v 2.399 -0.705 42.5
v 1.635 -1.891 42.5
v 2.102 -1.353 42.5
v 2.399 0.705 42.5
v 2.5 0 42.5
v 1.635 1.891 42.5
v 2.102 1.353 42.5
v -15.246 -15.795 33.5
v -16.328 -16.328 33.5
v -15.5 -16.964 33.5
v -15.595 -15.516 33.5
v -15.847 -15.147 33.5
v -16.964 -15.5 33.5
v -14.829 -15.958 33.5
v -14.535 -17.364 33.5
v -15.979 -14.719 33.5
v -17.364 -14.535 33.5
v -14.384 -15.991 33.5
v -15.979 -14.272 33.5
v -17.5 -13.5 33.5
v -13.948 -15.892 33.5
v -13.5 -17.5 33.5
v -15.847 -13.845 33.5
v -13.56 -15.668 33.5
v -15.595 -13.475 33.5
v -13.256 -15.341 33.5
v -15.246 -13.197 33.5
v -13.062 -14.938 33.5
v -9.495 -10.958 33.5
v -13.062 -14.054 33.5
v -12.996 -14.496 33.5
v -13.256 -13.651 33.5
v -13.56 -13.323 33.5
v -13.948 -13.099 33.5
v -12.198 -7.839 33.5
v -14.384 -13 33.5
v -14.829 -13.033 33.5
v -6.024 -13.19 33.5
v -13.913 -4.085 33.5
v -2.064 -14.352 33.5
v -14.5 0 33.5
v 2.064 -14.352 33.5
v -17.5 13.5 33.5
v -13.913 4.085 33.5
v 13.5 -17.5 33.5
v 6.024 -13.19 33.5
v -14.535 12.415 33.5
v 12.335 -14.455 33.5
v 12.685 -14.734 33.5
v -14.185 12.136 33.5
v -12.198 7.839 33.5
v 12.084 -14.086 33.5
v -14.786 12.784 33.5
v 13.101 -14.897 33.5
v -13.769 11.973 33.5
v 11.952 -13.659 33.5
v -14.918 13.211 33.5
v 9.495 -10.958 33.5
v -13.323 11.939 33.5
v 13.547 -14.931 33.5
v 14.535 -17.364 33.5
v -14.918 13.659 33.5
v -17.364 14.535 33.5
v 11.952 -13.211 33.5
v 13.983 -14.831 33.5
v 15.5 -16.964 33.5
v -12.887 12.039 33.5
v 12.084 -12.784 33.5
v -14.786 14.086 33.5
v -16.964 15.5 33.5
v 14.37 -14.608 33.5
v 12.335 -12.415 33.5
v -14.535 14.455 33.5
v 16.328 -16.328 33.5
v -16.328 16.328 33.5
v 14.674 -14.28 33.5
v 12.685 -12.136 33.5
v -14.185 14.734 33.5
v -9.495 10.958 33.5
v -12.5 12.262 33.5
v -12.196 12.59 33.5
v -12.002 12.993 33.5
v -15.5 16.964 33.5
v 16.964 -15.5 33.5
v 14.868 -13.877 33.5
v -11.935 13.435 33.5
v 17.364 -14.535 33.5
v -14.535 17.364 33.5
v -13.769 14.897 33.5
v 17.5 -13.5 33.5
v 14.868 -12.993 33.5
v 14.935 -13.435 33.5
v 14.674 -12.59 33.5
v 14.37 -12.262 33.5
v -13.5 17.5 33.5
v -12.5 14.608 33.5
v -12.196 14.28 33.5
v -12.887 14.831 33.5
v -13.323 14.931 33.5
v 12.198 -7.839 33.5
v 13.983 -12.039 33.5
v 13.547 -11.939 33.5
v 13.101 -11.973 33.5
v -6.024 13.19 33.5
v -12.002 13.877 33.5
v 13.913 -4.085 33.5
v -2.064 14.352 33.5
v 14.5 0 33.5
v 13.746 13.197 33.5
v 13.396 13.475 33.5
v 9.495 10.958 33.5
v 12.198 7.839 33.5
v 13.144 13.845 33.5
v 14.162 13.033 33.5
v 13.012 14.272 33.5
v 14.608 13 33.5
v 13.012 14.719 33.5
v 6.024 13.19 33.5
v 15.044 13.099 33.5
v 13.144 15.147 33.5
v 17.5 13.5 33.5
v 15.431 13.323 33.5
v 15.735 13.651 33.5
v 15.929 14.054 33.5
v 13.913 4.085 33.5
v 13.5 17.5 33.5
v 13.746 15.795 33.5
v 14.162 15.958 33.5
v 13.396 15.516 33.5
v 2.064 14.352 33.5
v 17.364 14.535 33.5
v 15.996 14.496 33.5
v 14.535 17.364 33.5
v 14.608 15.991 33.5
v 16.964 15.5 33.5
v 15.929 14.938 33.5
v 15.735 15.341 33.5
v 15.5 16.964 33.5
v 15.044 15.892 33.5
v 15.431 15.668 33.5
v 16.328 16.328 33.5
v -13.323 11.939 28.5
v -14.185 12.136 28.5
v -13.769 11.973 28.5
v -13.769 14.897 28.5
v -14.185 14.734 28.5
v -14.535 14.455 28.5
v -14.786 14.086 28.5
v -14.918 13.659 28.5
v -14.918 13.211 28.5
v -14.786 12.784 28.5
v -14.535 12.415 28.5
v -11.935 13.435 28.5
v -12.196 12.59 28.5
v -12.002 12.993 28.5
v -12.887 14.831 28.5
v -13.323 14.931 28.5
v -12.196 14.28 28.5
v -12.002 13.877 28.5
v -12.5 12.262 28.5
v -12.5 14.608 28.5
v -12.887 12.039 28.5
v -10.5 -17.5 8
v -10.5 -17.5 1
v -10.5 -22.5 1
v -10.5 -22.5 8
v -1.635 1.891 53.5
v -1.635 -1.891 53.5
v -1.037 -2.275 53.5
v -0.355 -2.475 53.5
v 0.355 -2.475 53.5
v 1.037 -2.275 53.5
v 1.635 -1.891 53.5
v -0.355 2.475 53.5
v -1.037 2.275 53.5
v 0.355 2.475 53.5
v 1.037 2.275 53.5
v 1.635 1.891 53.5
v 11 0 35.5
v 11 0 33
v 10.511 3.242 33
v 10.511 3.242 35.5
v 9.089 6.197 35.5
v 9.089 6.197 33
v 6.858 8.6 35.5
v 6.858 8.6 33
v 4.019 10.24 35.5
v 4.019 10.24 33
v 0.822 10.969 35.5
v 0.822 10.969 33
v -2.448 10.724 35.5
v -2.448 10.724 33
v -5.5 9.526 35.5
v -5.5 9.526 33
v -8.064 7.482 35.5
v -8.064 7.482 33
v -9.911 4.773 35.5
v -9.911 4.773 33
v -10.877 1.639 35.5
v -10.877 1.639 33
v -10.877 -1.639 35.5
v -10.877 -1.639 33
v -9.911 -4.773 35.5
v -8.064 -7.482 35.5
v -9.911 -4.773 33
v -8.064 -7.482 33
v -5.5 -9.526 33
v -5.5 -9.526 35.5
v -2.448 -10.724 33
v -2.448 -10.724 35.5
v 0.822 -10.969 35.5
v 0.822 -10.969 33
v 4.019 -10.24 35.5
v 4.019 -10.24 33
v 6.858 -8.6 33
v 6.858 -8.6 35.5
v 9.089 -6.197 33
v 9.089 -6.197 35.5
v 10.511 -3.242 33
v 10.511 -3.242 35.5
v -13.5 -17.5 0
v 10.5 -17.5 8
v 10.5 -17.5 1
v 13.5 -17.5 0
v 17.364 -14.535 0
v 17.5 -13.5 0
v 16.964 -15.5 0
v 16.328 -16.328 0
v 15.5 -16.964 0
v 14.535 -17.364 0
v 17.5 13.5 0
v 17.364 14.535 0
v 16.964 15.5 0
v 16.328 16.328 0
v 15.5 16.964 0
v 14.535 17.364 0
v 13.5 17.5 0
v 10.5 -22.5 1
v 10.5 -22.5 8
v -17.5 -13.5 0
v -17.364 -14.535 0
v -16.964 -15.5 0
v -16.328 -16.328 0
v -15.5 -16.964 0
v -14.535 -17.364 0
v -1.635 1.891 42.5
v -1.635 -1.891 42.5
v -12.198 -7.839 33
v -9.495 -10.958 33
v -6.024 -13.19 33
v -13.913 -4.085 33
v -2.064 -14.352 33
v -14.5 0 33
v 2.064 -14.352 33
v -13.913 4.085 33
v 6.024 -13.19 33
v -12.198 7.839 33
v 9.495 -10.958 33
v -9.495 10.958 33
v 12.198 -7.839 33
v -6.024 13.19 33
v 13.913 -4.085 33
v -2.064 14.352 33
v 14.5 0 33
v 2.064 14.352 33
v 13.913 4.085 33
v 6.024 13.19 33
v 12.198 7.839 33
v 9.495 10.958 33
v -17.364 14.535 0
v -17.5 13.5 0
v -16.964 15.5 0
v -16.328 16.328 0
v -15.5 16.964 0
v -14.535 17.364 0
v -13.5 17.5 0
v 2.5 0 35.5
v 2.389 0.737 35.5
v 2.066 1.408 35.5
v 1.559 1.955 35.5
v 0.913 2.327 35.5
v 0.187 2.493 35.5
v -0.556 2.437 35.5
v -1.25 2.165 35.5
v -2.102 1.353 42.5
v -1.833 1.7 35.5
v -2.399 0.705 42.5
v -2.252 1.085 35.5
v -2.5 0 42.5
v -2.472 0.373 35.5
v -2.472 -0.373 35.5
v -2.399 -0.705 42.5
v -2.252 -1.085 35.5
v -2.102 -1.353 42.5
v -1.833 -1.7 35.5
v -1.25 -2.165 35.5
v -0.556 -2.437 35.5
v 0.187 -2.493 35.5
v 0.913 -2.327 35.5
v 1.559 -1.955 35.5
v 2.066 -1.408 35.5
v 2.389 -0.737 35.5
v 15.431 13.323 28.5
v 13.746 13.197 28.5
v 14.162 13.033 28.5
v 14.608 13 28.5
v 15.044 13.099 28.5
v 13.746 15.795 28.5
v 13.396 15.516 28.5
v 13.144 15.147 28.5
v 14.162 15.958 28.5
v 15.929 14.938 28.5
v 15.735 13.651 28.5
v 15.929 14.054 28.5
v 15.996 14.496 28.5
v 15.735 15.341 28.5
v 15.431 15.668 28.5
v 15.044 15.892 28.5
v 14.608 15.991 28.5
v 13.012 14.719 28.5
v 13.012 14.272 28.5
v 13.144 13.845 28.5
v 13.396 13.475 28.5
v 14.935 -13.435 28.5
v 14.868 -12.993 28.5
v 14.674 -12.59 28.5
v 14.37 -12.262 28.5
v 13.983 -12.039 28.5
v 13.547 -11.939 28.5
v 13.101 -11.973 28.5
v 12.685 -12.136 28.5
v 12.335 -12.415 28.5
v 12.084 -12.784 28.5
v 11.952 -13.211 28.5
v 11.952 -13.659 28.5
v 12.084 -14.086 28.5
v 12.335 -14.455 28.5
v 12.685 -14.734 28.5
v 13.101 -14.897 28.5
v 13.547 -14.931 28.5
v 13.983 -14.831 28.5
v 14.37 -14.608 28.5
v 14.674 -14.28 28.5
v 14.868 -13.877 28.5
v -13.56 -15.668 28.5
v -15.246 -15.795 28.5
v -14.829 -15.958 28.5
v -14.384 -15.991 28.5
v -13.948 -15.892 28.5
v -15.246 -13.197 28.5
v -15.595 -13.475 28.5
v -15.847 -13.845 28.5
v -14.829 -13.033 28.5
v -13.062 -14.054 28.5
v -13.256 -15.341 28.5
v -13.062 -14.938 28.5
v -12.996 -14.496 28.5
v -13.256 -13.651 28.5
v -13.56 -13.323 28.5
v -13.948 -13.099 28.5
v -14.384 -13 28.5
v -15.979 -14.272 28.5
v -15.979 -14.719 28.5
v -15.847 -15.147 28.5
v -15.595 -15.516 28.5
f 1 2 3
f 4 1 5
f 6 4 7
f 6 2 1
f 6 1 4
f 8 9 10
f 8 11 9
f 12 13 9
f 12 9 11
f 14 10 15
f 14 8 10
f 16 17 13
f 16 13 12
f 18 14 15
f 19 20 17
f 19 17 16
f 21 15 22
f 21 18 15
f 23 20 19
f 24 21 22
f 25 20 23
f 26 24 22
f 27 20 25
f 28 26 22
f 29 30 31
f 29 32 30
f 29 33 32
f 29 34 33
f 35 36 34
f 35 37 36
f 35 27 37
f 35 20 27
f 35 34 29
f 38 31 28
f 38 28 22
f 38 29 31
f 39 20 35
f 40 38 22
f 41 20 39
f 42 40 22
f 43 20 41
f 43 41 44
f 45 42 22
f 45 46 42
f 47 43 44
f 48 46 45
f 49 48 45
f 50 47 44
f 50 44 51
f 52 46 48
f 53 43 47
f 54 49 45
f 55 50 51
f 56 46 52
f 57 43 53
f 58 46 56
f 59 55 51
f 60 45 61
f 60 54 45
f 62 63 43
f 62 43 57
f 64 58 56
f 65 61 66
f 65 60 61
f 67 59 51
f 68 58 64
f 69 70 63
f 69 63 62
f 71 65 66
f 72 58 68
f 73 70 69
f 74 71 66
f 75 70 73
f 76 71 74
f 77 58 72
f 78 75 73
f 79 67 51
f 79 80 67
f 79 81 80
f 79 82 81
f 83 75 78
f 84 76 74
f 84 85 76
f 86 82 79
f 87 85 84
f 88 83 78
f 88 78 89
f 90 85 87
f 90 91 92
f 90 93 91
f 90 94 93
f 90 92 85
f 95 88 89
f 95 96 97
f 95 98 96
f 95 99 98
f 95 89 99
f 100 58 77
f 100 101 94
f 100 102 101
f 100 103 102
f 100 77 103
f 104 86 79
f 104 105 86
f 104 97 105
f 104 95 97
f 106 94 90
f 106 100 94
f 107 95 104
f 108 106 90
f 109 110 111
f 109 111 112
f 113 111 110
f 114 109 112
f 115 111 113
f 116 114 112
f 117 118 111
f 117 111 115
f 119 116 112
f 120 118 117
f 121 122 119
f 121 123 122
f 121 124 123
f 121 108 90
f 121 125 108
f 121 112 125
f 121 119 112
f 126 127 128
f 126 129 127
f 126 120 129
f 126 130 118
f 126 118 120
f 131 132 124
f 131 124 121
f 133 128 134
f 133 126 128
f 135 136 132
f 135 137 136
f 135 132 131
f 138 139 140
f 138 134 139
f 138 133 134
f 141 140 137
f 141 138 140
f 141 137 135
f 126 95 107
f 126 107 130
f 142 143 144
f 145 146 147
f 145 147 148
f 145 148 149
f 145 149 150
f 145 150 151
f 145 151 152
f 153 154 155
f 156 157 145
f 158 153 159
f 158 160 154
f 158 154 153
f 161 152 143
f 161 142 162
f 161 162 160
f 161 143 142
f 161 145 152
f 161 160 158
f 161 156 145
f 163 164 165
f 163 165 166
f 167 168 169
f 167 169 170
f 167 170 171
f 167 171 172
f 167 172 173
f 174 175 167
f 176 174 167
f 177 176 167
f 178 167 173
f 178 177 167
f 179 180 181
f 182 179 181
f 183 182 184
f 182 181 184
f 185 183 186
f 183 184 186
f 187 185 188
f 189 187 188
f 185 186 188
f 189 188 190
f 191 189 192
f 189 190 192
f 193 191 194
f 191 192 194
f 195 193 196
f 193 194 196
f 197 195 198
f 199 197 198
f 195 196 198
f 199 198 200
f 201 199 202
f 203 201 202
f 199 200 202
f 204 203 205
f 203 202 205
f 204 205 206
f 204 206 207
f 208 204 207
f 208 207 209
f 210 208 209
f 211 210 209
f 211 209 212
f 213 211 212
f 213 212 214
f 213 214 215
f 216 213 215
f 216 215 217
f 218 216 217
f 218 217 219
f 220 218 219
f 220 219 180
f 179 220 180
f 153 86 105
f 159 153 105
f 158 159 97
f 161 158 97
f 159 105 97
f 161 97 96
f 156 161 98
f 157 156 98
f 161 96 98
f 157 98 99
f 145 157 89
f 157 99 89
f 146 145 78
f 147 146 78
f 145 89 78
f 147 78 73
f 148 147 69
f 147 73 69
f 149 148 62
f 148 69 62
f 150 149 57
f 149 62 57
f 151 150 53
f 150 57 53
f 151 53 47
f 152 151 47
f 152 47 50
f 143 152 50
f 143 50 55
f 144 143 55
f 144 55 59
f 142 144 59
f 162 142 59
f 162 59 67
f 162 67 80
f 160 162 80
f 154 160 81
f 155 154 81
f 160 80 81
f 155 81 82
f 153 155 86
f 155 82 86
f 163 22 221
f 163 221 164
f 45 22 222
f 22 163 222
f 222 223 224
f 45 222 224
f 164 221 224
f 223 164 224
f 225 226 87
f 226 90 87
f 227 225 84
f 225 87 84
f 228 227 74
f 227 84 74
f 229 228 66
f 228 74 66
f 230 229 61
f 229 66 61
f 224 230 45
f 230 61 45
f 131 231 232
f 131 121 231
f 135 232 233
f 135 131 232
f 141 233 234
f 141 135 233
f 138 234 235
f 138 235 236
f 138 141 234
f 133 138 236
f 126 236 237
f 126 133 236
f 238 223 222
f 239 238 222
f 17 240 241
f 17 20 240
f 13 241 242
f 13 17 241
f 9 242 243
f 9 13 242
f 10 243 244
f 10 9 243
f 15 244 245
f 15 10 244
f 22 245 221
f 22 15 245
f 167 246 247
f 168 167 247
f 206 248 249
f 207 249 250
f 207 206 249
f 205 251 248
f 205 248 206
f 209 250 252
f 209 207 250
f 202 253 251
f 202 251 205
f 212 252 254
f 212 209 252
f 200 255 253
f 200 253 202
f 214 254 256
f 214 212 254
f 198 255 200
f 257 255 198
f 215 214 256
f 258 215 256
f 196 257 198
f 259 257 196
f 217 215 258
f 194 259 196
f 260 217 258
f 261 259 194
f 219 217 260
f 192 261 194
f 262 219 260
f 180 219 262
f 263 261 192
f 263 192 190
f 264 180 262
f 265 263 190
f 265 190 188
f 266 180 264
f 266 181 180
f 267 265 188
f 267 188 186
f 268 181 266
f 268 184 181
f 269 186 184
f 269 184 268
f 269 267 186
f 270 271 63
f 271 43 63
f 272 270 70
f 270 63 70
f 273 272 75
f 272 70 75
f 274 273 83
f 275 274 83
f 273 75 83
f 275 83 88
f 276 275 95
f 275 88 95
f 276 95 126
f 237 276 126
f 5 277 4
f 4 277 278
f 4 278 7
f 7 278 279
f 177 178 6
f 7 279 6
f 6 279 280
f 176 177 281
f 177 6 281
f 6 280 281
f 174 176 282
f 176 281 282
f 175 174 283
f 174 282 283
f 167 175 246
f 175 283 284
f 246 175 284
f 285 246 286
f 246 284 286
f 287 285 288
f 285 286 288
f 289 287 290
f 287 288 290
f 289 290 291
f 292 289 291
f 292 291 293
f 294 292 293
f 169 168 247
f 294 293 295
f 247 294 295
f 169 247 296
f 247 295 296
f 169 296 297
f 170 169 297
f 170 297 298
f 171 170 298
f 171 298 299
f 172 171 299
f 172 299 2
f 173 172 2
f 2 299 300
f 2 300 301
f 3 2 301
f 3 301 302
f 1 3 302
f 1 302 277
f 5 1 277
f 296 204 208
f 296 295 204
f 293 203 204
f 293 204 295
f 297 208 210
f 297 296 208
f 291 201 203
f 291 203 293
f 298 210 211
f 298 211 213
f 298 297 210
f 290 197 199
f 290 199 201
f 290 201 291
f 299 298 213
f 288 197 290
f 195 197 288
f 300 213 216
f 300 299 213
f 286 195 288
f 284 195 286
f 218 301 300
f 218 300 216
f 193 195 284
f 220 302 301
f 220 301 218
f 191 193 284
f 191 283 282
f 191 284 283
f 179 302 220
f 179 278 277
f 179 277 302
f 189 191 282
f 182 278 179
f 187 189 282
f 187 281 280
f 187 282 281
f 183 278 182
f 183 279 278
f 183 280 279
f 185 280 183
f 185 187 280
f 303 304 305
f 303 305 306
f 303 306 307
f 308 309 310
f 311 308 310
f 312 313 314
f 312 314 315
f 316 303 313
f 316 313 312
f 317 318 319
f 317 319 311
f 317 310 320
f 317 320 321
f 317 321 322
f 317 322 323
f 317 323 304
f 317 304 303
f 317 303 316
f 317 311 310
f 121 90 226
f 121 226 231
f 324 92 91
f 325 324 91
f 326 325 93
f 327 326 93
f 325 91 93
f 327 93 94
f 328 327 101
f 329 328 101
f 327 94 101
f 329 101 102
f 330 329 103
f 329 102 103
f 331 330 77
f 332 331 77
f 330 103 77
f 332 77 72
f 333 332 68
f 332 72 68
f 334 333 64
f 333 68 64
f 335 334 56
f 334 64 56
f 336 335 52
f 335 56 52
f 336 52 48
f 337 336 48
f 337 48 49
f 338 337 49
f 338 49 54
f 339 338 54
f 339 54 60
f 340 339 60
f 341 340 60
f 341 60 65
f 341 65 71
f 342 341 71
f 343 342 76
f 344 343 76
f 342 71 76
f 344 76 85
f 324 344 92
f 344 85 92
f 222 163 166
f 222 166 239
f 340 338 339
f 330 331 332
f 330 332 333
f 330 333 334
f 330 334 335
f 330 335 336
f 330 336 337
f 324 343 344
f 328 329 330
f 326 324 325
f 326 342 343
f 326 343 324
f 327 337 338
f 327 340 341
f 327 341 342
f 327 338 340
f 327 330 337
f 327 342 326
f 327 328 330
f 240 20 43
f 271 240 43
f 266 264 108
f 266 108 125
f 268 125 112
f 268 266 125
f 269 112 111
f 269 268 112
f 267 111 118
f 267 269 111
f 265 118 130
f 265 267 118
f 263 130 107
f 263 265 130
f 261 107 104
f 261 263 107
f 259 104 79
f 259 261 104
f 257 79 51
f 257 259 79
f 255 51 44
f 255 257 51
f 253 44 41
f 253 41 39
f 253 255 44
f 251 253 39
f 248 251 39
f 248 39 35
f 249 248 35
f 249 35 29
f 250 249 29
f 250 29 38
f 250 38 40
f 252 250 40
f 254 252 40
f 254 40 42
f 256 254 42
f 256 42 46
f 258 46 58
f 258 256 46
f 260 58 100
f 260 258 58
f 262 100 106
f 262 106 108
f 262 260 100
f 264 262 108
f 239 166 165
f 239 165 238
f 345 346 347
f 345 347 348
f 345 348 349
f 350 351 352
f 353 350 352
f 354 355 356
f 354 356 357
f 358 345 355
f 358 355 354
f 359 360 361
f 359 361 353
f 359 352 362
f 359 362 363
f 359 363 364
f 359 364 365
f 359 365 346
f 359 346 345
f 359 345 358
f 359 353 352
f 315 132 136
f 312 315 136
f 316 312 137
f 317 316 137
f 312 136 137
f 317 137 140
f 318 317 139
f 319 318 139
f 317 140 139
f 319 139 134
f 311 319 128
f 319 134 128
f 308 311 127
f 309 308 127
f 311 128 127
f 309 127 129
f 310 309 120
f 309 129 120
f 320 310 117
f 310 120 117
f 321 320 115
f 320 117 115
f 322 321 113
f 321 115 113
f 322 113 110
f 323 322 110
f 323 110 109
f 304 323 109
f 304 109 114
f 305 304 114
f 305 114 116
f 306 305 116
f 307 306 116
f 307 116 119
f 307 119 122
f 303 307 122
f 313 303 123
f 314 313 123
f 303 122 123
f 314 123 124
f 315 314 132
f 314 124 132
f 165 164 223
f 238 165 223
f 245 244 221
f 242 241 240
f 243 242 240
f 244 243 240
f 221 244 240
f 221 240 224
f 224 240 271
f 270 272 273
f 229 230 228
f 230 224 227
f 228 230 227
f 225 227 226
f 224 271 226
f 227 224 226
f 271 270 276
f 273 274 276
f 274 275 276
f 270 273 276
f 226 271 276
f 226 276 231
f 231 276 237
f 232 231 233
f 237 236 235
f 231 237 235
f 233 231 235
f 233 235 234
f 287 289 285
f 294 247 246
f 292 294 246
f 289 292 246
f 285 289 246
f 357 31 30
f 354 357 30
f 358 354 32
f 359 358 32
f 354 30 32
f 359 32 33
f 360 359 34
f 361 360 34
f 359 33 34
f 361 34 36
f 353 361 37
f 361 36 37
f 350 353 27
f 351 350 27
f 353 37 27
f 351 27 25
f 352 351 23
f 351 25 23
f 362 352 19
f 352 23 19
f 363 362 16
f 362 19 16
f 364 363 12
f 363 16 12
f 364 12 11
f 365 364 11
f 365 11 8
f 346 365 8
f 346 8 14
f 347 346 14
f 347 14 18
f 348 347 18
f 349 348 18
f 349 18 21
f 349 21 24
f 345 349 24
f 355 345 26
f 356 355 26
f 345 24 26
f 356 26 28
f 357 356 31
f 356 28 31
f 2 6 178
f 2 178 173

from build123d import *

# Parameters (mm, degrees)
SKETCH1_W           = 35
SKETCH1_H           = 35
BOSS_EXTRUDE1_DEPTH = 33.5
SKETCH2_R           = 11
BOSS_EXTRUDE2_DEPTH = 2
CUT_EXTRUDE1_START  = -0.5
SKETCH3_R           = 14.5
SKETCH3_R_2         = 11
CUT_EXTRUDE1_DEPTH  = 0.5
FILLET1_R           = 4
SKETCH4_R           = 1.5
CUT_EXTRUDE2_DEPTH  = 5
SKETCH5_R           = 2.5
BOSS_EXTRUDE3_DEPTH = 18
CUT_EXTRUDE3_START  = -11
CUT_EXTRUDE3_DEPTH  = 11
SKETCH7_W           = 21
SKETCH7_H           = 7
BOSS_EXTRUDE4_DEPTH = 5


with BuildPart() as part:
    # Sketch1 → Boss-Extrude1 (new body)
    with BuildSketch(Plane.XY):
        Rectangle(SKETCH1_W, SKETCH1_H)
    extrude(amount=BOSS_EXTRUDE1_DEPTH)

    # Sketch2 → Boss-Extrude2 (add)
    with BuildSketch(Plane.XY.offset(33.5)):
        Circle(SKETCH2_R)
    extrude(amount=BOSS_EXTRUDE2_DEPTH)

    # Sketch3 → Cut-Extrude1 (cut)
    with BuildSketch(Plane.XY.offset(33.5).offset(CUT_EXTRUDE1_START)):
        Circle(SKETCH3_R)
        Circle(SKETCH3_R_2, mode=Mode.SUBTRACT)
    extrude(amount=CUT_EXTRUDE1_DEPTH, mode=Mode.SUBTRACT)

    # Fillet1
    fillet1_edges = [part.edges().sort_by_distance(p)[0] for p in [
        (17.5, -17.5, 16.75),
        (-17.5, -17.5, 16.75),
        (-17.5, 17.5, 16.75),
        (17.5, 17.5, 16.75),
    ]]
    fillet(fillet1_edges, radius=FILLET1_R)

    # Sketch4 → Cut-Extrude2 (cut)
    with BuildSketch(Plane.XY.offset(33.5)):
        with Locations((14.495689014, 14.495689014)):
            Circle(SKETCH4_R)
        with Locations((-14.495689014, -14.495689014)):
            Circle(SKETCH4_R)
        with Locations((-13.435028843, 13.435028843)):
            Circle(SKETCH4_R)
        with Locations((13.435028843, -13.435028843)):
            Circle(SKETCH4_R)
    extrude(amount=-CUT_EXTRUDE2_DEPTH, mode=Mode.SUBTRACT)

    # Sketch5 → Boss-Extrude3 (add)
    with BuildSketch(Plane.XY.offset(35.5)):
        Circle(SKETCH5_R)
    extrude(amount=BOSS_EXTRUDE3_DEPTH)

    # Sketch6 → Cut-Extrude3 (cut)
    with BuildSketch(Plane.XY.offset(53.5).offset(CUT_EXTRUDE3_START)):
        with BuildLine():
            Line((1.63546218, 1.890836708), (1.63546218, -1.890836708))
            ThreePointArc((1.63546218, -1.890836708), (2.5, 0), (1.63546218, 1.890836708))
        make_face()
        with BuildLine():
            Line((-1.63546218, 1.890836708), (-1.63546218, -1.890836708))
            ThreePointArc((-1.63546218, -1.890836708), (-2.5, 0), (-1.63546218, 1.890836708))
        make_face()
    extrude(amount=CUT_EXTRUDE3_DEPTH, mode=Mode.SUBTRACT)

    # Sketch7 → Boss-Extrude4 (add)
    with BuildSketch(Plane.XZ.offset(17.5)):
        with Locations((0, 4.5)):
            Rectangle(SKETCH7_W, SKETCH7_H)
    extrude(amount=BOSS_EXTRUDE4_DEPTH)


solid = part.part
